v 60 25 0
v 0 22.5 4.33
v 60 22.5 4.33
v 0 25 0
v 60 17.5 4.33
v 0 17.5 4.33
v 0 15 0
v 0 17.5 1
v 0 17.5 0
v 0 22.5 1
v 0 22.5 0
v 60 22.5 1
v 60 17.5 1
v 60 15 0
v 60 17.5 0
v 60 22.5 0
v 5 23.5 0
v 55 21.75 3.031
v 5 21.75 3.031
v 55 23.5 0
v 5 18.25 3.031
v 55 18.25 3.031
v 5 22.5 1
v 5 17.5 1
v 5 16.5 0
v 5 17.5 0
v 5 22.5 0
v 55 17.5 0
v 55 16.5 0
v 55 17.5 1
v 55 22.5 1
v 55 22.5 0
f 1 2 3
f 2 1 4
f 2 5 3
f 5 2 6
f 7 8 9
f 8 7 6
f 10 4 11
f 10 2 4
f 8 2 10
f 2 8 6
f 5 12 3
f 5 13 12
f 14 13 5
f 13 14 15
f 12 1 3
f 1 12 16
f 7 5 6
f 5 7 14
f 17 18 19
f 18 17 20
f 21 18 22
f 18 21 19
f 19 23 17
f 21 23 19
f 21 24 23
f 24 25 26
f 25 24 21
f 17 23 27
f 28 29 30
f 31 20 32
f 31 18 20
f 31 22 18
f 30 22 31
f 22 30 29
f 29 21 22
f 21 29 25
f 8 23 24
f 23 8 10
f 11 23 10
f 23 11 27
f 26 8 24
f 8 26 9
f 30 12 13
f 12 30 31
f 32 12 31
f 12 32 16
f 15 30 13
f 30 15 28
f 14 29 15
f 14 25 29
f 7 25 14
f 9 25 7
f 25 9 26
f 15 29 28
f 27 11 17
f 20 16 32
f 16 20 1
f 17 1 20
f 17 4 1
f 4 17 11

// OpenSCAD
$fn=6;

internalDiameter=7;
thickness=1.5;
diameter=internalDiameter+2*thickness;
length=60;

rectangleHeight=2;
rectangleWidth=5;
rectangleDepth=5;
internalLength=length-rectangleDepth*2;

connectorDistance=10;
connectorLength=15;
connectorHoleDiameter=2.5;
connectorDiameter=2;

if (true) {
translate([0,diameter+connectorDistance,0]) half();
} else {


half();
translate([0,diameter/2,-diameter/4+1.5]) cube([length,2,1.5]);
translate([0,diameter/2-2,0]) cube([length,4,2.5]);

translate([0,-diameter/2-2,-diameter/4+1.5]) cube([length,2,1.5]);
translate([0,-diameter/2-2,0]) cube([length,4,2.5]);
}

module half() {
difference() {
  rotate([30,0,0]) rotate([0,90,0]) cylinder(d=diameter, h=length);
  rotate([30,0,0]) translate([rectangleDepth,0,0]) rotate([0,90,0]) cylinder(d=internalDiameter, h=internalLength);
  translate([0, -rectangleWidth/2,-(rectangleHeight/2)]) cube([rectangleWidth,rectangleDepth,rectangleHeight]);
  translate([length-rectangleDepth, -rectangleWidth/2,-(rectangleHeight/2)]) cube([rectangleWidth,rectangleDepth,rectangleHeight]);
  translate([0,-diameter/2,-diameter/2]) cube([length,diameter, diameter/2]);
}
}
